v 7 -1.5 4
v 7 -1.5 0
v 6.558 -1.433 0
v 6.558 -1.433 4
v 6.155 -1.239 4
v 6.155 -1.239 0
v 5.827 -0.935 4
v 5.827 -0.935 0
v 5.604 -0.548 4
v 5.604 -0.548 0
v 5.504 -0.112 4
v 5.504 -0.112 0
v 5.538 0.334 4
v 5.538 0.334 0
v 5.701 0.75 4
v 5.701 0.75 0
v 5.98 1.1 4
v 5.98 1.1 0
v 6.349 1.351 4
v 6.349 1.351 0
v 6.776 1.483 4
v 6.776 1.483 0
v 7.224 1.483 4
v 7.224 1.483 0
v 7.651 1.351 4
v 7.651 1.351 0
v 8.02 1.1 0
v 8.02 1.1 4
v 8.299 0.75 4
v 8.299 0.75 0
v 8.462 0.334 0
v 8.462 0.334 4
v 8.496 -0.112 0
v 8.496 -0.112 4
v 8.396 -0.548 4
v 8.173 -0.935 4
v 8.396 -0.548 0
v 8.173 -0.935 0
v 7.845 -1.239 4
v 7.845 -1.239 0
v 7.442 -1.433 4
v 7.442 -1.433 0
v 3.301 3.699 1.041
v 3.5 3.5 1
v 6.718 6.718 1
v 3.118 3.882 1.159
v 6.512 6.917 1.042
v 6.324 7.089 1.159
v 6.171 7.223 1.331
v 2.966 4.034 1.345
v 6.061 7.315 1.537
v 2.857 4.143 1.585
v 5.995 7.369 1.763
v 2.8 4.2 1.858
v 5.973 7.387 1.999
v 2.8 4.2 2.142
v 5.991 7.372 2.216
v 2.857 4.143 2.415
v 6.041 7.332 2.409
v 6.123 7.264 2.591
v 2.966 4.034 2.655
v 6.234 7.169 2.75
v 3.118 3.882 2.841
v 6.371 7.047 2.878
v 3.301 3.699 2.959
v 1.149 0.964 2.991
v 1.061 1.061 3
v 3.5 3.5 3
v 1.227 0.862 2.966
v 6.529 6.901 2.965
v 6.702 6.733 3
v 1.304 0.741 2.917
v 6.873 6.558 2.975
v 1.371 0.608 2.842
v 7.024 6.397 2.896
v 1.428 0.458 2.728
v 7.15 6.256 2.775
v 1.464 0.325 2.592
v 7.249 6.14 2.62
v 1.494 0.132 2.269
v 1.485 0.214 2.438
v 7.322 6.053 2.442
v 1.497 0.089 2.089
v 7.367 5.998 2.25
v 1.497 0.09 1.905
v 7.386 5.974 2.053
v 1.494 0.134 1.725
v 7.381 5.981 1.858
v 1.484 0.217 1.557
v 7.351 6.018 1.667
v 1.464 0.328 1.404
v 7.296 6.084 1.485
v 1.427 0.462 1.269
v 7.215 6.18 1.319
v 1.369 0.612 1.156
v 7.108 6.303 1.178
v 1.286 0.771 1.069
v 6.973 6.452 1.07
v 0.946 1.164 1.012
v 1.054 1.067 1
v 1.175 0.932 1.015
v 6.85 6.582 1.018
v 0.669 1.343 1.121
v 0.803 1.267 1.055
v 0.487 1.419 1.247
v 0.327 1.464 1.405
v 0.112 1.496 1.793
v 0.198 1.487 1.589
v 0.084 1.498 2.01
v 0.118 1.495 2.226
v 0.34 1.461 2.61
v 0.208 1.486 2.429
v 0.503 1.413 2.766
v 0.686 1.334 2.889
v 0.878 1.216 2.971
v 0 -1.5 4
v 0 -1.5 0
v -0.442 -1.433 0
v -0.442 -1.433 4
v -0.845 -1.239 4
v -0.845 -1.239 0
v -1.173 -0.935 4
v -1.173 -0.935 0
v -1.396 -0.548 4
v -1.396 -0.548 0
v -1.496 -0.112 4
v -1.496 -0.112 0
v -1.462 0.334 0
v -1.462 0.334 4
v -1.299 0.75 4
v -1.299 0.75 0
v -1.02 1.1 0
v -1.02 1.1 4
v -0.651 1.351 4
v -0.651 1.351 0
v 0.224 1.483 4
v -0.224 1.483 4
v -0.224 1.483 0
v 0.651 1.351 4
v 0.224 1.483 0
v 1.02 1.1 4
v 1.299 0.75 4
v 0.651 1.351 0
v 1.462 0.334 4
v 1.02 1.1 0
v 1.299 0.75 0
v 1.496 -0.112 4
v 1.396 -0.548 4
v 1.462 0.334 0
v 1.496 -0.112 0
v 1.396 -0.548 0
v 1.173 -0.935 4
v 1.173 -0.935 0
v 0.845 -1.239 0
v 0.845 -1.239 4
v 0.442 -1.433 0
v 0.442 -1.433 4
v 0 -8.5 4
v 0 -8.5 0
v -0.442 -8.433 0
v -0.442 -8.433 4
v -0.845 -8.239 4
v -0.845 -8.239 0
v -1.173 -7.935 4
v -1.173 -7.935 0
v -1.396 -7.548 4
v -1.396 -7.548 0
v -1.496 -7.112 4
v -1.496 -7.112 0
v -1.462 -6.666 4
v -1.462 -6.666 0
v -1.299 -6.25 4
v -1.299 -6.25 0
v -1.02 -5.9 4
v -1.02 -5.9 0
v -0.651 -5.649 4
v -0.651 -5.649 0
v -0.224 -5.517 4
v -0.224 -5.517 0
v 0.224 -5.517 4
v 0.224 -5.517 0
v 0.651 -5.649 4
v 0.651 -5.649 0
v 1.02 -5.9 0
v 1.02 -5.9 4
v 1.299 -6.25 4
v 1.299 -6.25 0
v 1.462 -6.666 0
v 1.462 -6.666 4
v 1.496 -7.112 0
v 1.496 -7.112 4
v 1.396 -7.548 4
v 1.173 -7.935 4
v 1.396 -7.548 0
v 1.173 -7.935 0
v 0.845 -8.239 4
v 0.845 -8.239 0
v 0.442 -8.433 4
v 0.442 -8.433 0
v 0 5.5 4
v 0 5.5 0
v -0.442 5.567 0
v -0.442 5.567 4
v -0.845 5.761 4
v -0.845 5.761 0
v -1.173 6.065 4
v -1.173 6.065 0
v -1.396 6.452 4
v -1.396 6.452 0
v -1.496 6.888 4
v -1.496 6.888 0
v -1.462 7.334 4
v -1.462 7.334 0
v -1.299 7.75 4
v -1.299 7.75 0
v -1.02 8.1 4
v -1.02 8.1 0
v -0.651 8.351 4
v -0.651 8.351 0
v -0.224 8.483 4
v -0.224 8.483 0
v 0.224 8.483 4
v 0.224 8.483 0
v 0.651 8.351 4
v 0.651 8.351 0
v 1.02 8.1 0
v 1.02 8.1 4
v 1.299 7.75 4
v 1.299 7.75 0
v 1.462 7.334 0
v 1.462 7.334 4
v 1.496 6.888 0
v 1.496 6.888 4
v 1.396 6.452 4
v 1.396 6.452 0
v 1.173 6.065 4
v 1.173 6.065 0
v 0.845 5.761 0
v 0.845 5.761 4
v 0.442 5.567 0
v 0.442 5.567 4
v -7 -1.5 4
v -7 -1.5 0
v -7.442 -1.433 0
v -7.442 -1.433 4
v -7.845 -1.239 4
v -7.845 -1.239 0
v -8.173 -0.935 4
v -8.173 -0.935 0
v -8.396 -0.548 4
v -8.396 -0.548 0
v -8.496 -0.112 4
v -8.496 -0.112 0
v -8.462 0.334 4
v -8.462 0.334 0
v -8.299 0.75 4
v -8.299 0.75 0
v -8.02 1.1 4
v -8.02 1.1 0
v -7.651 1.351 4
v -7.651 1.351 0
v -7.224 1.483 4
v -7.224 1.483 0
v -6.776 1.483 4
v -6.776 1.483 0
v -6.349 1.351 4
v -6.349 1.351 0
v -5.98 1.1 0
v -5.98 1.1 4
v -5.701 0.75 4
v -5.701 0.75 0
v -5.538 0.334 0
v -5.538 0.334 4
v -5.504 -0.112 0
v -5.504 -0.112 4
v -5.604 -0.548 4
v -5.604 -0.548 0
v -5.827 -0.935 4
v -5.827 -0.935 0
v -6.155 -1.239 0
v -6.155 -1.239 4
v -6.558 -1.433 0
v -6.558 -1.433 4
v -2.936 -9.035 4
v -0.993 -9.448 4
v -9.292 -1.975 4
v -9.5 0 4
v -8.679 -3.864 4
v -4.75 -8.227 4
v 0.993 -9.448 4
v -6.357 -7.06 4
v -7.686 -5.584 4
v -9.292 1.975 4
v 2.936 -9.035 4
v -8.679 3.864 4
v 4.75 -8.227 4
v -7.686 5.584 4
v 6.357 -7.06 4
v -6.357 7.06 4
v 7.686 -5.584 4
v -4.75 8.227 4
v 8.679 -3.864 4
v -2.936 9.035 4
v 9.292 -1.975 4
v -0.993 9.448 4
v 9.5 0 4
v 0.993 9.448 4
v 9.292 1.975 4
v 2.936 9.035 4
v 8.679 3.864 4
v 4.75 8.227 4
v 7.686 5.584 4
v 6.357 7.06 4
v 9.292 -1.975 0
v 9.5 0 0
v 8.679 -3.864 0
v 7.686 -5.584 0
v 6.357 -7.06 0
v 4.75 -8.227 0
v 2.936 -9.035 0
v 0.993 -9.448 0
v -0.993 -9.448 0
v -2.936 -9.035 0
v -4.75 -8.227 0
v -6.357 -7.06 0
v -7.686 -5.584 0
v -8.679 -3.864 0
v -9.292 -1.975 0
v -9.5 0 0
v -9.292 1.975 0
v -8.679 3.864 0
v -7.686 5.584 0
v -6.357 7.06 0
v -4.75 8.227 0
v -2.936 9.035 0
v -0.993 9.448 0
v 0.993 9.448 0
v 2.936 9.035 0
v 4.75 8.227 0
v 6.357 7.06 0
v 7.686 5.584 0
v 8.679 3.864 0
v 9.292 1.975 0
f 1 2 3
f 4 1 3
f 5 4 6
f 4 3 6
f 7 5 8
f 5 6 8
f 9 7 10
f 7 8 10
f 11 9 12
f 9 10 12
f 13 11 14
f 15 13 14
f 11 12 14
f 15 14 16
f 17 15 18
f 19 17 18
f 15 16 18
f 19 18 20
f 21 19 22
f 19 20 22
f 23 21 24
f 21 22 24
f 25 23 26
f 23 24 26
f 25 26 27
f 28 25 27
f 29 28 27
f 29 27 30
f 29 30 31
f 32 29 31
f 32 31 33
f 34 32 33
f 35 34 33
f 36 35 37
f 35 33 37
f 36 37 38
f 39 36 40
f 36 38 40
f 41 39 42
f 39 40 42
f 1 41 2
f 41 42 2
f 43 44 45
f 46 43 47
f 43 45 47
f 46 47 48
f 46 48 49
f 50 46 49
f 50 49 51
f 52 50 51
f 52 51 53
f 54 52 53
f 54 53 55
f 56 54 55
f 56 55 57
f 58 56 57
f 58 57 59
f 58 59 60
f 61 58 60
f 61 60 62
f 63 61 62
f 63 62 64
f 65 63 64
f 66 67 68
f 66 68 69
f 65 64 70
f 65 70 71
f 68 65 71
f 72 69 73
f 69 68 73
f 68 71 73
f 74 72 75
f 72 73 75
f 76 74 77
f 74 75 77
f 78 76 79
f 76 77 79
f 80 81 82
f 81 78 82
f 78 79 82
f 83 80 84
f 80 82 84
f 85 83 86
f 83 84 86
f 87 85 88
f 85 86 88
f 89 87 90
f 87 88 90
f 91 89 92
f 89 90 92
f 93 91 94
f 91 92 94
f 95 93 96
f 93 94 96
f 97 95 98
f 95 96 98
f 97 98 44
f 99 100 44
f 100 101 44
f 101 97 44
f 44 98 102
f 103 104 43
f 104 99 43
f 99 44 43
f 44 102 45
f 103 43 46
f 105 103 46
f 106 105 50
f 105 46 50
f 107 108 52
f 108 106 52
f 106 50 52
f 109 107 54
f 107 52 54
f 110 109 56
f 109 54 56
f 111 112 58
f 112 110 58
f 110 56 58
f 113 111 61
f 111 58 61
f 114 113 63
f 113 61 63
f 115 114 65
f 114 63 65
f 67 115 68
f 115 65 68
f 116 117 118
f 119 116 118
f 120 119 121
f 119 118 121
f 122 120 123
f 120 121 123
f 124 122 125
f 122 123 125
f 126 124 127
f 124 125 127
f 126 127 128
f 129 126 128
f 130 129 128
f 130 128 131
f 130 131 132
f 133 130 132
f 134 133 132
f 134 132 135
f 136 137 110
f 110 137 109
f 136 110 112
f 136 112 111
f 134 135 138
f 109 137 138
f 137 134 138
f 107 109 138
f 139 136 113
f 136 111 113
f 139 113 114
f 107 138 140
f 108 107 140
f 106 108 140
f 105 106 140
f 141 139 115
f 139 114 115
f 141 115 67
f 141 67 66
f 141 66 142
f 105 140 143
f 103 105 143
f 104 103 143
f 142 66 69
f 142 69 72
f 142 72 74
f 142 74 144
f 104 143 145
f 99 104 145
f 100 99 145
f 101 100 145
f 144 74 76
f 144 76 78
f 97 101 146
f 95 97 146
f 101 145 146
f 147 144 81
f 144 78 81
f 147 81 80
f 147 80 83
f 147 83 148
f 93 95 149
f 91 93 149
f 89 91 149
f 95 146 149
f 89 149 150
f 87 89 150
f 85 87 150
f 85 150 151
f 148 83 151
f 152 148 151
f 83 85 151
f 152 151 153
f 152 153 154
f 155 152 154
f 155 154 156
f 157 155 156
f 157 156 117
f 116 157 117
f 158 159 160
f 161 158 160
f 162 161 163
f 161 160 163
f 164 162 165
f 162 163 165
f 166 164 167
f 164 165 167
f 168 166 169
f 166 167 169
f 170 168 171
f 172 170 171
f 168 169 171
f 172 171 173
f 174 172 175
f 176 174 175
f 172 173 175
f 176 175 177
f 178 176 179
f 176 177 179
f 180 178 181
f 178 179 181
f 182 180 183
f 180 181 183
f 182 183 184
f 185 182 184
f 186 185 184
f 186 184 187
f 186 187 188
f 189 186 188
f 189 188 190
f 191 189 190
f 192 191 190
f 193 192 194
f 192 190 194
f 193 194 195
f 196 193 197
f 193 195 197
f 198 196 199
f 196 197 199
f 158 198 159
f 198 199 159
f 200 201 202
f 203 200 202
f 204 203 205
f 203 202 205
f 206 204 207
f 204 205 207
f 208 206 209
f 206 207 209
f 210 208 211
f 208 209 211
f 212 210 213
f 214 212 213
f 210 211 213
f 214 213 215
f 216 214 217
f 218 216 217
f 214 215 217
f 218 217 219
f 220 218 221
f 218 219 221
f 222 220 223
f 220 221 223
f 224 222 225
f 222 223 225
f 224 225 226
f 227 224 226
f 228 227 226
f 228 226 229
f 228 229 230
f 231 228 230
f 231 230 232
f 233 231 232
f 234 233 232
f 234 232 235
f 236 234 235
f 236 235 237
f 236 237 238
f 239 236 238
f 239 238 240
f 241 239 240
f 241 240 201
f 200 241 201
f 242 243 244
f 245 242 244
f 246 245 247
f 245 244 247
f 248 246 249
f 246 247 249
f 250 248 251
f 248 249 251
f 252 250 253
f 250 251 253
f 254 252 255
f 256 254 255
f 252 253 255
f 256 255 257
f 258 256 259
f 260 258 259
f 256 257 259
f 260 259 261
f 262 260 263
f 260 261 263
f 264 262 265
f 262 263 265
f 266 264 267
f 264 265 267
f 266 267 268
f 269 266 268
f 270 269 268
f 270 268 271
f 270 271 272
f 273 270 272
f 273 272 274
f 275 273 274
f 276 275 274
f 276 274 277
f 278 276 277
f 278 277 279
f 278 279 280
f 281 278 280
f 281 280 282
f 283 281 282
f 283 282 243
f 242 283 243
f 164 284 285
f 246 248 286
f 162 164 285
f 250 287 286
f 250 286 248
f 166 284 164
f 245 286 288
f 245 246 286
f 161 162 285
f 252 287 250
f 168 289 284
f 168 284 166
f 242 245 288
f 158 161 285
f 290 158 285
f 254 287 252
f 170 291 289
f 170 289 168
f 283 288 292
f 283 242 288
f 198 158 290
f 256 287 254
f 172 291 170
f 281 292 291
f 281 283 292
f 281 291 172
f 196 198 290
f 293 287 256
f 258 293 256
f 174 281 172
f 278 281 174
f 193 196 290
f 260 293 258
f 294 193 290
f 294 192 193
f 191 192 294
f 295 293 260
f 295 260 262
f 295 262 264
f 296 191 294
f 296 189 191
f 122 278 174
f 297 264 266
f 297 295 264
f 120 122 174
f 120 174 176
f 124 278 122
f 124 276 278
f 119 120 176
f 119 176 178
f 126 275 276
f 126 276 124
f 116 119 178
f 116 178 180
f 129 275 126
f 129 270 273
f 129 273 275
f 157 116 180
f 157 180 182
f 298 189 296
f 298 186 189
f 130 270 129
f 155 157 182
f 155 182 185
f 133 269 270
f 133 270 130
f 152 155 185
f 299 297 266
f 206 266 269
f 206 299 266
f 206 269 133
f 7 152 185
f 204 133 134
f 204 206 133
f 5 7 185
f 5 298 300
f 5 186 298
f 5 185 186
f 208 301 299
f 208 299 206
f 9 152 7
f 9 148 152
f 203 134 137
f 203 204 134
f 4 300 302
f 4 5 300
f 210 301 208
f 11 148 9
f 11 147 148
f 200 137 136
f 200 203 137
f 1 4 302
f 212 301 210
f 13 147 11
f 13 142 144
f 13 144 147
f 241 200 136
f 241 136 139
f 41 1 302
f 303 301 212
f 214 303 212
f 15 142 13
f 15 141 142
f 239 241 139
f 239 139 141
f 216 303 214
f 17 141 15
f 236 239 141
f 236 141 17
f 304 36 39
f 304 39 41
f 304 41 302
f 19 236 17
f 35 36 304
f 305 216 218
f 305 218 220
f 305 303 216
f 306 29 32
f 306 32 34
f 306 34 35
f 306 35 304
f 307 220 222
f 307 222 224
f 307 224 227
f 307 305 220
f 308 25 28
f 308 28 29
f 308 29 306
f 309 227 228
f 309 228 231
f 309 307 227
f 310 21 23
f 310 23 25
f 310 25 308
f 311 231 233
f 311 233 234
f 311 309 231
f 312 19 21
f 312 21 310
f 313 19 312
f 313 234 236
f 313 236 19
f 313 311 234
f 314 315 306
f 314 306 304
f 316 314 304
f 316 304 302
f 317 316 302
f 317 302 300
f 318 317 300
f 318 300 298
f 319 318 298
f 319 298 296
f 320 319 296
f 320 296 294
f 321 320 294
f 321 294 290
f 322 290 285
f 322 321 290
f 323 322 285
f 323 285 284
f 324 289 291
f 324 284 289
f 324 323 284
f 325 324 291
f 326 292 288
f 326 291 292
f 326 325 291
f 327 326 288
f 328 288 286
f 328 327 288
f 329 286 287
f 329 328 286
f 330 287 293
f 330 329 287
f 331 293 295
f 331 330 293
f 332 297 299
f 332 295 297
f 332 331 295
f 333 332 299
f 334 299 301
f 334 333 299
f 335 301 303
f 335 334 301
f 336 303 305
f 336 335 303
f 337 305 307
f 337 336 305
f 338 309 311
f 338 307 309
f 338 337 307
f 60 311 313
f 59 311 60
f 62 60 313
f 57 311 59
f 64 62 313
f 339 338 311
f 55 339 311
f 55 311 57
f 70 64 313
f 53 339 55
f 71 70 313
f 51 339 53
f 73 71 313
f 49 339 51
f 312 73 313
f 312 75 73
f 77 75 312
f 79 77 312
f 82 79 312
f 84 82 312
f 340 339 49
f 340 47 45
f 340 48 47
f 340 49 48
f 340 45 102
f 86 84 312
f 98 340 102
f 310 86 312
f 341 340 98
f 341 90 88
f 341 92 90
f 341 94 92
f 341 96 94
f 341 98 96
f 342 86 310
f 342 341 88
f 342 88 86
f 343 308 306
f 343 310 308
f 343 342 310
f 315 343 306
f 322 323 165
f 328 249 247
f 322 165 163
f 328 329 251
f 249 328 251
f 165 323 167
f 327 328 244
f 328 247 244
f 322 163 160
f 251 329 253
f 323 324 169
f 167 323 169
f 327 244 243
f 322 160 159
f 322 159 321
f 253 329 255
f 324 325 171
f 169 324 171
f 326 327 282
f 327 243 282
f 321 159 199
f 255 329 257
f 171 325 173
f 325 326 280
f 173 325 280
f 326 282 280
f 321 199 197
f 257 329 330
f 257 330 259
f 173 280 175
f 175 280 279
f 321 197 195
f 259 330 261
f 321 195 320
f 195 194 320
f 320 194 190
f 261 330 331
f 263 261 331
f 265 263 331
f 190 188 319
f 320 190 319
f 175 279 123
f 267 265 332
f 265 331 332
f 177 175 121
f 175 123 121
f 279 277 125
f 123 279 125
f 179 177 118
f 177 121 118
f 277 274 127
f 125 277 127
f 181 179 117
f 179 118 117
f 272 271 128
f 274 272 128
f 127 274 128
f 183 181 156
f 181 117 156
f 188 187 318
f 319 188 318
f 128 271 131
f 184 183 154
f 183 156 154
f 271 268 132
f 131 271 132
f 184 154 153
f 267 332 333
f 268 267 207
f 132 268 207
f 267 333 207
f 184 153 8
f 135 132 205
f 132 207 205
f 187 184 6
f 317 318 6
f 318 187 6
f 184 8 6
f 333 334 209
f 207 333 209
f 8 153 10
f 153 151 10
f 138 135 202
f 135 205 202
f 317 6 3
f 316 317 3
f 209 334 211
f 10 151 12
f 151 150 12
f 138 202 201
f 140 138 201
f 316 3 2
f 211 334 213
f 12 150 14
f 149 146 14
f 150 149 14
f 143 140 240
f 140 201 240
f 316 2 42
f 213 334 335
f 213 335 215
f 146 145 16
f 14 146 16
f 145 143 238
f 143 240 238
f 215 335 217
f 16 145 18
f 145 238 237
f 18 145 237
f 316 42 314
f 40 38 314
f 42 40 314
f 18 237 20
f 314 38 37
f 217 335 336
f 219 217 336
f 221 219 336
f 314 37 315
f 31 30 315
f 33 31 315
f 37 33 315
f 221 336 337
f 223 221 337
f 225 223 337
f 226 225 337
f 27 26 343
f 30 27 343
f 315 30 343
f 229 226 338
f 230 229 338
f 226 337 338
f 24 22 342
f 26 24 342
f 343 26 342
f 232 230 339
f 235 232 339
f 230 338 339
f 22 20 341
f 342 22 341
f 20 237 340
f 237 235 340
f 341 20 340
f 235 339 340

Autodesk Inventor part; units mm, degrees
ref_plane "YZ Plane" through (0, 0, 0) normal (1, 0, 0) x (0, 1, 0)
ref_plane "XZ Plane" through (0, 0, 0) normal (0, 1, 0) x (-1, 0, 0)
sketch "Эскиз1" plane through (0, 0, 0) normal (0, 0, 1) x (1, 0, 0)
  circle A0 centre (0, 0) radius 9.5
  dimension "d0" = 19
extrude "Выдавливание1" add sketch "Эскиз1" along normal blind 4
sketch "Эскиз2" plane through (0, 0, 4) normal (0, 0, 1) x (1, 0, 0)
  circle A0 centre (0, 0) radius 7 construction
  line L0 (-7, 0) -> (7, 0) construction
  line L1 (0, 7) -> (0, -7) construction
  dimension "d3" = 14
hole "Отверстие1" at (0, 7, 4) at (0, 0, 4) at (7, 0, 4) at (-7, 0, 4) at (0, -7, 4) direction (0, 0, -1) diameter 3 end through all
ref_plane "РабПлоскость1" through (7, 0, -23.1662) normal (-0.7071068, -0.7071068, 0) x (0, 0, 1)
sketch "Эскиз4" plane through (7, 0, -23.1662) normal (-0.7071068, -0.7071068, 0) x (0, 0, 1)
  line L0 (23.1662, 3.4497) -> (23.1662, 6.4497) projected
  line L1 (27.1662, 6.4497) -> (27.1662, 3.4497) projected
  line L2 (27.1662, -4.5503) -> (27.1662, 14.4497) projected
  line L3 (27.1662, 4.9497) -> (23.1662, 4.9497)
  point P0 (25.1662, 4.9497)
hole "Отверстие2" at (3.5, 3.5, 2) direction (0.7071068, 0.7071068, 0) diameter 2 end through all
sketch "Эскиз5" plane through (3.5, 3.5, 2) normal (0.7071068, 0.7071068, 0) x (-0.7071068, 0.7071068, 0)
  circle A0 centre (0, 0) radius 1 projected
  point P0 (0, -2)
hole "Отверстие3" at (3.5, 3.5, 2) direction (-0.7071068, -0.7071068, 0) diameter 2 end up to surface
thread "Резьба1" size "M3x0.5" class "6H" standard "ANSI Metric M Profile" full length
thread "Резьба2" size "M3x0.5" class "6H" standard "ANSI Metric M Profile" full length
thread "Резьба3" size "M3x0.5" class "6H" standard "ANSI Metric M Profile" full length
thread "Резьба4" size "M3x0.5" class "6H" standard "ANSI Metric M Profile" full length
thread "Резьба5" size "M2x0.4" class "6H" standard "ANSI Metric M Profile" full length
properties part number "Планшайба D19"
